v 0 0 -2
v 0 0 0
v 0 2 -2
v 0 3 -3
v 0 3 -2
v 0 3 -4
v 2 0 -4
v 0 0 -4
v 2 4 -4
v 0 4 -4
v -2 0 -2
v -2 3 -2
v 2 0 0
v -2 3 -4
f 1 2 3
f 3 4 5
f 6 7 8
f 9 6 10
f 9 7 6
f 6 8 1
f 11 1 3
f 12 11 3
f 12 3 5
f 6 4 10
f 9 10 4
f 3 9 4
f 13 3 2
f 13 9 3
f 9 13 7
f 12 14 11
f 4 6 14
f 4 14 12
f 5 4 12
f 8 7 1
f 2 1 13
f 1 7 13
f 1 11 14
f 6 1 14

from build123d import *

# Parameters (mm, degrees)
SKETCH1_W           = 4
SKETCH1_H           = 4
BOSS_EXTRUDE1_DEPTH = 2
SKETCH2_W           = 2
SKETCH2_H           = 3
BOSS_EXTRUDE2_DEPTH = 2
CUT_EXTRUDE1_DEPTH  = 2
CUT_EXTRUDE2_DEPTH  = 2


with BuildPart() as part:
    # Sketch1 → Boss-Extrude1 (new body)
    with BuildSketch(Plane(origin=(0, 0, 0), x_dir=(0, 0, -1), z_dir=(1, 0, 0))):
        with Locations((2, 2)):
            Rectangle(SKETCH1_W, SKETCH1_H)
    extrude(amount=BOSS_EXTRUDE1_DEPTH)

    # Sketch2 → Boss-Extrude2 (add)
    with BuildSketch(Plane.ZY):
        with Locations((-3, 1.5)):
            Rectangle(SKETCH2_W, SKETCH2_H)
    extrude(amount=BOSS_EXTRUDE2_DEPTH)

    # Sketch3 → Cut-Extrude1 (cut)
    with BuildSketch(Plane.ZY.offset(2)):
        Polygon((-2, 0), (-4, 3), (-4, 0), align=None)
    extrude(amount=-CUT_EXTRUDE1_DEPTH, mode=Mode.SUBTRACT)

    # Sketch4 → Cut-Extrude2 (cut)
    with BuildSketch(Plane(origin=(2, 0, 0), x_dir=(0, 0, -1), z_dir=(1, 0, 0))):
        Polygon((4, 4), (0, 0), (0, 4), align=None)
    extrude(amount=-CUT_EXTRUDE2_DEPTH, mode=Mode.SUBTRACT)


solid = part.part
